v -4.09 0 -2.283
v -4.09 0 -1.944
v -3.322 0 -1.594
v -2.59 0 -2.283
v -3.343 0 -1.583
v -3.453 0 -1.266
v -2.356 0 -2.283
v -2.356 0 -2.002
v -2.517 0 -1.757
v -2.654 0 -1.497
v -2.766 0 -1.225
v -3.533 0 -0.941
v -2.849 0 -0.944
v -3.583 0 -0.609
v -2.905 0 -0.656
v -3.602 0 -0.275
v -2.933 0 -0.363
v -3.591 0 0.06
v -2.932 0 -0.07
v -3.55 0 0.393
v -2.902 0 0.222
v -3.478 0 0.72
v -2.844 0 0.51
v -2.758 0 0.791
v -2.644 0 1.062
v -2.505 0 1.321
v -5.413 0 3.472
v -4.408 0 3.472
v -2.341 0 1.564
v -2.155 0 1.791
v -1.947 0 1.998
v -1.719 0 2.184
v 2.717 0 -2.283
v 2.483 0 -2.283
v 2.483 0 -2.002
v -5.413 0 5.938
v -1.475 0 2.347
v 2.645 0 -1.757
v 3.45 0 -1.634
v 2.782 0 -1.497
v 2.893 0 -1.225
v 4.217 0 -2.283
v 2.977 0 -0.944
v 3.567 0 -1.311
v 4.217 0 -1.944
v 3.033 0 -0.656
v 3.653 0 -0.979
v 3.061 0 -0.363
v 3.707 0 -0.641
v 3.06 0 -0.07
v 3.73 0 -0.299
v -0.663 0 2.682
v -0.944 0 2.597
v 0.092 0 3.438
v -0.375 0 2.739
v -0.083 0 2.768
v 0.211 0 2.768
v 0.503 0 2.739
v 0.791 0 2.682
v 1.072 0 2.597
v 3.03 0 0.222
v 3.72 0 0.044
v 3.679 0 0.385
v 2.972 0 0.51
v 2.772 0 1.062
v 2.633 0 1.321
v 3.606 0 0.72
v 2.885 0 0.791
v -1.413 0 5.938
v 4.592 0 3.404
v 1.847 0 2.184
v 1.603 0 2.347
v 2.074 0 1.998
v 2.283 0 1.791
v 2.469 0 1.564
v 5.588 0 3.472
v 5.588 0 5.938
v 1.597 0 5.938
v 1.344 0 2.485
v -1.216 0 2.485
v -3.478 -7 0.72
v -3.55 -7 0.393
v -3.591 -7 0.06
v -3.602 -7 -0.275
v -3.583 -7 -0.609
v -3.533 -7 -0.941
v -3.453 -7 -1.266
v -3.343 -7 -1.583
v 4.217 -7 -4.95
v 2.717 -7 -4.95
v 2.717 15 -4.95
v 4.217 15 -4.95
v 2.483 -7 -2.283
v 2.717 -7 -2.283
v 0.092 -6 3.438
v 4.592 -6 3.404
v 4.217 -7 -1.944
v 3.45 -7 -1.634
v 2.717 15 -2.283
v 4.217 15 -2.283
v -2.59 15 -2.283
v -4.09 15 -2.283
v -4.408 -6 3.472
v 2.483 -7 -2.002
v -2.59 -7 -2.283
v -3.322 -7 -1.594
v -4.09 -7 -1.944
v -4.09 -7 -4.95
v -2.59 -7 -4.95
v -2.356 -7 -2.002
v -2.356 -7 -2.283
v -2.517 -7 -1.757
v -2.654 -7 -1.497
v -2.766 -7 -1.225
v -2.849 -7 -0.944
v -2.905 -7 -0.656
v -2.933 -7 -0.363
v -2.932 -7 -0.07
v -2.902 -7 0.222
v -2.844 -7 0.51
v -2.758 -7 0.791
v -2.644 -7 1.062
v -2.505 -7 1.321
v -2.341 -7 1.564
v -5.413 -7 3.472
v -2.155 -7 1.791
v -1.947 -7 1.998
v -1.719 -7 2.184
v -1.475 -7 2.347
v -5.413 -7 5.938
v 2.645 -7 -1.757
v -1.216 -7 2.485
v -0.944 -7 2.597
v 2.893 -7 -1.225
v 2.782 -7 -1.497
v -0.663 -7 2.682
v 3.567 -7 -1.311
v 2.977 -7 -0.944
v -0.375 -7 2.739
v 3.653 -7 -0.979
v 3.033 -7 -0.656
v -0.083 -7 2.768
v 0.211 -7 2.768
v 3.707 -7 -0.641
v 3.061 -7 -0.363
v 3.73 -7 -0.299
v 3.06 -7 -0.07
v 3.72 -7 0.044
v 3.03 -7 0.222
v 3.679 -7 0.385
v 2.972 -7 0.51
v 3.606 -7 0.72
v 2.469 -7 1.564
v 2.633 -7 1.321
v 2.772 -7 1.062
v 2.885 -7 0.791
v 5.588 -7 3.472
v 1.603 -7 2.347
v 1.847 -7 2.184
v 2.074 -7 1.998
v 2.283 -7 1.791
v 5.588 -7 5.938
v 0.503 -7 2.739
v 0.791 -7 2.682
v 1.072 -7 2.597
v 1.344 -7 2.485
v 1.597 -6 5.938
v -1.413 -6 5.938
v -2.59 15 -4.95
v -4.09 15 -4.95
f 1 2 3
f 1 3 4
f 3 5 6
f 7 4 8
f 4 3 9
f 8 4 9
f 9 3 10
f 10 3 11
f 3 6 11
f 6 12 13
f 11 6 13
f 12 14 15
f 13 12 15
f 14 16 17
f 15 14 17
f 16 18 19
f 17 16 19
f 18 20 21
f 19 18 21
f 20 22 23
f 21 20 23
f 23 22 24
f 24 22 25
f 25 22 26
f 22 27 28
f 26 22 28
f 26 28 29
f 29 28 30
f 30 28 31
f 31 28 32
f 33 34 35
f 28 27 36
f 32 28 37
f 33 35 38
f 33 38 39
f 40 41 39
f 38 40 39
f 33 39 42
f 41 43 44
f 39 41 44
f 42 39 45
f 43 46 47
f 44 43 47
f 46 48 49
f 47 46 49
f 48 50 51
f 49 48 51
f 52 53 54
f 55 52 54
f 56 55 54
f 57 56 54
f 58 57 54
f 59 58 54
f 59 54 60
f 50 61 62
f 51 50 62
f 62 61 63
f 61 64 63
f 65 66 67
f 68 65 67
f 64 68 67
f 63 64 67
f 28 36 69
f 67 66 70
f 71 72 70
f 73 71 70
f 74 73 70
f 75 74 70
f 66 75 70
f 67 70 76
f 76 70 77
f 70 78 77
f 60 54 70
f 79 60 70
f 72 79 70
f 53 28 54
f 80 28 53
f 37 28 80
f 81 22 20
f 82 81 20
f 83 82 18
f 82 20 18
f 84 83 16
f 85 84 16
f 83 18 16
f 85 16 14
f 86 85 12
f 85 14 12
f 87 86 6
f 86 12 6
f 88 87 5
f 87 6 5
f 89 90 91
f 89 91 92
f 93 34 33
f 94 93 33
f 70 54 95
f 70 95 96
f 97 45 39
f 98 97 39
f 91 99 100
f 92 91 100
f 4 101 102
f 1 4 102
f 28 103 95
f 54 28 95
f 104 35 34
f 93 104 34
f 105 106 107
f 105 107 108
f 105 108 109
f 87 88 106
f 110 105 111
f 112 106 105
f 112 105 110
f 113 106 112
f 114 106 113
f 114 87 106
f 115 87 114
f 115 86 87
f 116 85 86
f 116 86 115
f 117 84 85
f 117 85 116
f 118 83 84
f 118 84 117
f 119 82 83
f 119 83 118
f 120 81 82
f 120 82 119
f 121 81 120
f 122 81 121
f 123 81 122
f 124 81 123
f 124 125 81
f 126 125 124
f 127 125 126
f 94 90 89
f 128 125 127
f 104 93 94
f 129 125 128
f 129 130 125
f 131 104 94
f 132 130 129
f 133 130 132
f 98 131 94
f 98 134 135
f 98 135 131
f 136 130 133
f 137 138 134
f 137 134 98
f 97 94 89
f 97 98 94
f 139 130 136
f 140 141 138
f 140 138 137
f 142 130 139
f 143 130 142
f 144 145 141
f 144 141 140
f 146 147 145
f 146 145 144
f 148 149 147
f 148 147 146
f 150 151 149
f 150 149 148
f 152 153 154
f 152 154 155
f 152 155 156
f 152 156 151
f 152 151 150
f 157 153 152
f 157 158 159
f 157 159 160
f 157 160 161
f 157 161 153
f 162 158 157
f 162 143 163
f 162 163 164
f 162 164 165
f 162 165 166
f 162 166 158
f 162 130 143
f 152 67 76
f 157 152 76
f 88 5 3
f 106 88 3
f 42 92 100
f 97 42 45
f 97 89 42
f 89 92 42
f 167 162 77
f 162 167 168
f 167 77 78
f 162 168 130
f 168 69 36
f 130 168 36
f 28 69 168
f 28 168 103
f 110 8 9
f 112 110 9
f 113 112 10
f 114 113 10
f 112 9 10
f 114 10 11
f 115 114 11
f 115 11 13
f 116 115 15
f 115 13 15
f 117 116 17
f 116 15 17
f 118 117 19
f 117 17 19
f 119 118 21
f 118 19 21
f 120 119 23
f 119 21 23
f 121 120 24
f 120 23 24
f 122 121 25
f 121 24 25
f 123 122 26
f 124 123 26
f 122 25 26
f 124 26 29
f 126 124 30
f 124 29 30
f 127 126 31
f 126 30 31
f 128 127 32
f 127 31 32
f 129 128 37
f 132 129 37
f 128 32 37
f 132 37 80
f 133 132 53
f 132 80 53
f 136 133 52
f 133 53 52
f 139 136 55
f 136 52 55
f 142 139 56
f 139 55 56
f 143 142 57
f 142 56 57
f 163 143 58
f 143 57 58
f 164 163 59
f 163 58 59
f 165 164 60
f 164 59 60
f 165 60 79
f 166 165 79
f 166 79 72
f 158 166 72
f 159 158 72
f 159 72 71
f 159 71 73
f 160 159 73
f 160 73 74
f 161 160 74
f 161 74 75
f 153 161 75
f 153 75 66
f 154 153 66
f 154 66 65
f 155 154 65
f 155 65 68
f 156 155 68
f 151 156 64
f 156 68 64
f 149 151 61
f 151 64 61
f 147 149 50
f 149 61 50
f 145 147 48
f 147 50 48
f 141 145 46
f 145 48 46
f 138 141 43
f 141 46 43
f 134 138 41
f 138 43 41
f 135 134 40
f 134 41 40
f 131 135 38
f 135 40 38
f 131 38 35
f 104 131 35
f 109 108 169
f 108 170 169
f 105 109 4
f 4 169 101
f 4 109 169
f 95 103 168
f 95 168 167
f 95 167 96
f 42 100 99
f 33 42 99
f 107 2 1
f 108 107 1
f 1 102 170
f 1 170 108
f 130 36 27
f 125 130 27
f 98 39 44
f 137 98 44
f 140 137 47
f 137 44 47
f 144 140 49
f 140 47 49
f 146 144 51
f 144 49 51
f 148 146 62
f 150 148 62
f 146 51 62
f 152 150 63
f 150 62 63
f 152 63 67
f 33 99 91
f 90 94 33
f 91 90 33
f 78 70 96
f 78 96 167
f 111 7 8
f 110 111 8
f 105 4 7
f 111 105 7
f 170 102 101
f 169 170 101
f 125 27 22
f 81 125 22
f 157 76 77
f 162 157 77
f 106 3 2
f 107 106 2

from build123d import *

# Parameters (mm, degrees)
F1_DEPTH = 7
F2_DEPTH = 6
F3_DEPTH = 15


with BuildPart() as f1:
    # F0 (on Front) → F1 (new body)
    with BuildSketch(Plane.XZ):
        with BuildLine():
            ThreePointArc((-3.477884, 0.719832), (-3.596369, -0.44229), (-3.343322, -1.5827))
            Line((-3.343322, -1.5827), (-3.322458, -1.593981))
            Line((-3.322458, -1.593981), (-3.322458, -2.283465))
            Line((-3.322458, -2.283465), (-2.589551, -2.283465))
            Line((-2.589551, -2.283465), (-2.355576, -2.283465))
            Line((-2.355576, -2.283465), (-2.355576, -2.00205))
            ThreePointArc((-2.355576, -2.00205), (0.063946, 2.771621), (2.483469, -2.00205))
            Line((2.483469, -2.00205), (2.483469, -2.283465))
            Line((2.483469, -2.283465), (2.717444, -2.283465))
            Line((2.717444, -2.283465), (3.450351, -2.283465))
            Line((3.450351, -2.283465), (3.450351, -1.634055))
            ThreePointArc((3.450351, -1.634055), (3.72254, -0.469953), (3.605777, 0.719832))
            ThreePointArc((3.605777, 0.719832), (2.307299, 2.6718), (0.091662, 3.438077))
            ThreePointArc((0.091662, 3.438077), (-2.157419, 2.688675), (-3.477884, 0.719832))
        make_face()
        Polygon((-3.322458, -2.283465), (-3.322458, -1.593981), (-4.089551, -1.943924), (-4.089551, -2.283465), align=None)
        with BuildLine():
            Line((-5.413338, 3.472093), (-3.477884, 0.719832))
            ThreePointArc((-3.477884, 0.719832), (-2.157419, 2.688675), (0.091662, 3.438077))
            Line((0.091662, 3.438077), (-4.408209, 3.472093))
            Line((-4.408209, 3.472093), (-1.413338, 5.938077))
            Line((-1.413338, 5.938077), (-5.413338, 5.938077))
            Line((-5.413338, 5.938077), (-5.413338, 3.472093))
        make_face()
        Polygon((-2.589551, -2.283465), (-3.322458, -2.283465), (-4.089551, -2.283465), (-4.089551, -4.949721), (-3.322458, -4.949721), (-2.589551, -4.949721), align=None)
        with BuildLine():
            Line((4.591534, 3.404061), (0.091662, 3.438077))
            ThreePointArc((0.091662, 3.438077), (2.307299, 2.6718), (3.605777, 0.719832))
            Line((3.605777, 0.719832), (5.587751, 3.472093))
            Line((5.587751, 3.472093), (5.587751, 5.938077))
            Line((5.587751, 5.938077), (1.596662, 5.938077))
            Line((1.596662, 5.938077), (4.591534, 3.404061))
        make_face()
        Polygon((-4.408209, 3.472093), (0.091662, 3.438077), (4.591534, 3.404061), (1.596662, 5.938077), (-1.413338, 5.938077), align=None)
        Polygon((4.217444, -1.943924), (3.450351, -1.634055), (3.450351, -2.283465), (4.217444, -2.283465), align=None)
        Polygon((4.217444, -2.283465), (3.450351, -2.283465), (2.717444, -2.283465), (2.717444, -4.949721), (3.450351, -4.949721), (4.217444, -4.949721), align=None)
    extrude(amount=F1_DEPTH)

    # F0 (on Front) → F2 (cut)
    with BuildSketch(Plane.XZ):
        Polygon((-4.408209, 3.472093), (0.091662, 3.438077), (4.591534, 3.404061), (1.596662, 5.938077), (-1.413338, 5.938077), align=None)
    extrude(amount=F2_DEPTH, mode=Mode.SUBTRACT)

    # F0 (on Front) → F3 (join)
    with BuildSketch(Plane.XZ):
        Polygon((4.217444, -2.283465), (3.450351, -2.283465), (2.717444, -2.283465), (2.717444, -4.949721), (3.450351, -4.949721), (4.217444, -4.949721), align=None)
        Polygon((-2.589551, -2.283465), (-3.322458, -2.283465), (-4.089551, -2.283465), (-4.089551, -4.949721), (-3.322458, -4.949721), (-2.589551, -4.949721), align=None)
    extrude(amount=-F3_DEPTH)


solid = f1.part
